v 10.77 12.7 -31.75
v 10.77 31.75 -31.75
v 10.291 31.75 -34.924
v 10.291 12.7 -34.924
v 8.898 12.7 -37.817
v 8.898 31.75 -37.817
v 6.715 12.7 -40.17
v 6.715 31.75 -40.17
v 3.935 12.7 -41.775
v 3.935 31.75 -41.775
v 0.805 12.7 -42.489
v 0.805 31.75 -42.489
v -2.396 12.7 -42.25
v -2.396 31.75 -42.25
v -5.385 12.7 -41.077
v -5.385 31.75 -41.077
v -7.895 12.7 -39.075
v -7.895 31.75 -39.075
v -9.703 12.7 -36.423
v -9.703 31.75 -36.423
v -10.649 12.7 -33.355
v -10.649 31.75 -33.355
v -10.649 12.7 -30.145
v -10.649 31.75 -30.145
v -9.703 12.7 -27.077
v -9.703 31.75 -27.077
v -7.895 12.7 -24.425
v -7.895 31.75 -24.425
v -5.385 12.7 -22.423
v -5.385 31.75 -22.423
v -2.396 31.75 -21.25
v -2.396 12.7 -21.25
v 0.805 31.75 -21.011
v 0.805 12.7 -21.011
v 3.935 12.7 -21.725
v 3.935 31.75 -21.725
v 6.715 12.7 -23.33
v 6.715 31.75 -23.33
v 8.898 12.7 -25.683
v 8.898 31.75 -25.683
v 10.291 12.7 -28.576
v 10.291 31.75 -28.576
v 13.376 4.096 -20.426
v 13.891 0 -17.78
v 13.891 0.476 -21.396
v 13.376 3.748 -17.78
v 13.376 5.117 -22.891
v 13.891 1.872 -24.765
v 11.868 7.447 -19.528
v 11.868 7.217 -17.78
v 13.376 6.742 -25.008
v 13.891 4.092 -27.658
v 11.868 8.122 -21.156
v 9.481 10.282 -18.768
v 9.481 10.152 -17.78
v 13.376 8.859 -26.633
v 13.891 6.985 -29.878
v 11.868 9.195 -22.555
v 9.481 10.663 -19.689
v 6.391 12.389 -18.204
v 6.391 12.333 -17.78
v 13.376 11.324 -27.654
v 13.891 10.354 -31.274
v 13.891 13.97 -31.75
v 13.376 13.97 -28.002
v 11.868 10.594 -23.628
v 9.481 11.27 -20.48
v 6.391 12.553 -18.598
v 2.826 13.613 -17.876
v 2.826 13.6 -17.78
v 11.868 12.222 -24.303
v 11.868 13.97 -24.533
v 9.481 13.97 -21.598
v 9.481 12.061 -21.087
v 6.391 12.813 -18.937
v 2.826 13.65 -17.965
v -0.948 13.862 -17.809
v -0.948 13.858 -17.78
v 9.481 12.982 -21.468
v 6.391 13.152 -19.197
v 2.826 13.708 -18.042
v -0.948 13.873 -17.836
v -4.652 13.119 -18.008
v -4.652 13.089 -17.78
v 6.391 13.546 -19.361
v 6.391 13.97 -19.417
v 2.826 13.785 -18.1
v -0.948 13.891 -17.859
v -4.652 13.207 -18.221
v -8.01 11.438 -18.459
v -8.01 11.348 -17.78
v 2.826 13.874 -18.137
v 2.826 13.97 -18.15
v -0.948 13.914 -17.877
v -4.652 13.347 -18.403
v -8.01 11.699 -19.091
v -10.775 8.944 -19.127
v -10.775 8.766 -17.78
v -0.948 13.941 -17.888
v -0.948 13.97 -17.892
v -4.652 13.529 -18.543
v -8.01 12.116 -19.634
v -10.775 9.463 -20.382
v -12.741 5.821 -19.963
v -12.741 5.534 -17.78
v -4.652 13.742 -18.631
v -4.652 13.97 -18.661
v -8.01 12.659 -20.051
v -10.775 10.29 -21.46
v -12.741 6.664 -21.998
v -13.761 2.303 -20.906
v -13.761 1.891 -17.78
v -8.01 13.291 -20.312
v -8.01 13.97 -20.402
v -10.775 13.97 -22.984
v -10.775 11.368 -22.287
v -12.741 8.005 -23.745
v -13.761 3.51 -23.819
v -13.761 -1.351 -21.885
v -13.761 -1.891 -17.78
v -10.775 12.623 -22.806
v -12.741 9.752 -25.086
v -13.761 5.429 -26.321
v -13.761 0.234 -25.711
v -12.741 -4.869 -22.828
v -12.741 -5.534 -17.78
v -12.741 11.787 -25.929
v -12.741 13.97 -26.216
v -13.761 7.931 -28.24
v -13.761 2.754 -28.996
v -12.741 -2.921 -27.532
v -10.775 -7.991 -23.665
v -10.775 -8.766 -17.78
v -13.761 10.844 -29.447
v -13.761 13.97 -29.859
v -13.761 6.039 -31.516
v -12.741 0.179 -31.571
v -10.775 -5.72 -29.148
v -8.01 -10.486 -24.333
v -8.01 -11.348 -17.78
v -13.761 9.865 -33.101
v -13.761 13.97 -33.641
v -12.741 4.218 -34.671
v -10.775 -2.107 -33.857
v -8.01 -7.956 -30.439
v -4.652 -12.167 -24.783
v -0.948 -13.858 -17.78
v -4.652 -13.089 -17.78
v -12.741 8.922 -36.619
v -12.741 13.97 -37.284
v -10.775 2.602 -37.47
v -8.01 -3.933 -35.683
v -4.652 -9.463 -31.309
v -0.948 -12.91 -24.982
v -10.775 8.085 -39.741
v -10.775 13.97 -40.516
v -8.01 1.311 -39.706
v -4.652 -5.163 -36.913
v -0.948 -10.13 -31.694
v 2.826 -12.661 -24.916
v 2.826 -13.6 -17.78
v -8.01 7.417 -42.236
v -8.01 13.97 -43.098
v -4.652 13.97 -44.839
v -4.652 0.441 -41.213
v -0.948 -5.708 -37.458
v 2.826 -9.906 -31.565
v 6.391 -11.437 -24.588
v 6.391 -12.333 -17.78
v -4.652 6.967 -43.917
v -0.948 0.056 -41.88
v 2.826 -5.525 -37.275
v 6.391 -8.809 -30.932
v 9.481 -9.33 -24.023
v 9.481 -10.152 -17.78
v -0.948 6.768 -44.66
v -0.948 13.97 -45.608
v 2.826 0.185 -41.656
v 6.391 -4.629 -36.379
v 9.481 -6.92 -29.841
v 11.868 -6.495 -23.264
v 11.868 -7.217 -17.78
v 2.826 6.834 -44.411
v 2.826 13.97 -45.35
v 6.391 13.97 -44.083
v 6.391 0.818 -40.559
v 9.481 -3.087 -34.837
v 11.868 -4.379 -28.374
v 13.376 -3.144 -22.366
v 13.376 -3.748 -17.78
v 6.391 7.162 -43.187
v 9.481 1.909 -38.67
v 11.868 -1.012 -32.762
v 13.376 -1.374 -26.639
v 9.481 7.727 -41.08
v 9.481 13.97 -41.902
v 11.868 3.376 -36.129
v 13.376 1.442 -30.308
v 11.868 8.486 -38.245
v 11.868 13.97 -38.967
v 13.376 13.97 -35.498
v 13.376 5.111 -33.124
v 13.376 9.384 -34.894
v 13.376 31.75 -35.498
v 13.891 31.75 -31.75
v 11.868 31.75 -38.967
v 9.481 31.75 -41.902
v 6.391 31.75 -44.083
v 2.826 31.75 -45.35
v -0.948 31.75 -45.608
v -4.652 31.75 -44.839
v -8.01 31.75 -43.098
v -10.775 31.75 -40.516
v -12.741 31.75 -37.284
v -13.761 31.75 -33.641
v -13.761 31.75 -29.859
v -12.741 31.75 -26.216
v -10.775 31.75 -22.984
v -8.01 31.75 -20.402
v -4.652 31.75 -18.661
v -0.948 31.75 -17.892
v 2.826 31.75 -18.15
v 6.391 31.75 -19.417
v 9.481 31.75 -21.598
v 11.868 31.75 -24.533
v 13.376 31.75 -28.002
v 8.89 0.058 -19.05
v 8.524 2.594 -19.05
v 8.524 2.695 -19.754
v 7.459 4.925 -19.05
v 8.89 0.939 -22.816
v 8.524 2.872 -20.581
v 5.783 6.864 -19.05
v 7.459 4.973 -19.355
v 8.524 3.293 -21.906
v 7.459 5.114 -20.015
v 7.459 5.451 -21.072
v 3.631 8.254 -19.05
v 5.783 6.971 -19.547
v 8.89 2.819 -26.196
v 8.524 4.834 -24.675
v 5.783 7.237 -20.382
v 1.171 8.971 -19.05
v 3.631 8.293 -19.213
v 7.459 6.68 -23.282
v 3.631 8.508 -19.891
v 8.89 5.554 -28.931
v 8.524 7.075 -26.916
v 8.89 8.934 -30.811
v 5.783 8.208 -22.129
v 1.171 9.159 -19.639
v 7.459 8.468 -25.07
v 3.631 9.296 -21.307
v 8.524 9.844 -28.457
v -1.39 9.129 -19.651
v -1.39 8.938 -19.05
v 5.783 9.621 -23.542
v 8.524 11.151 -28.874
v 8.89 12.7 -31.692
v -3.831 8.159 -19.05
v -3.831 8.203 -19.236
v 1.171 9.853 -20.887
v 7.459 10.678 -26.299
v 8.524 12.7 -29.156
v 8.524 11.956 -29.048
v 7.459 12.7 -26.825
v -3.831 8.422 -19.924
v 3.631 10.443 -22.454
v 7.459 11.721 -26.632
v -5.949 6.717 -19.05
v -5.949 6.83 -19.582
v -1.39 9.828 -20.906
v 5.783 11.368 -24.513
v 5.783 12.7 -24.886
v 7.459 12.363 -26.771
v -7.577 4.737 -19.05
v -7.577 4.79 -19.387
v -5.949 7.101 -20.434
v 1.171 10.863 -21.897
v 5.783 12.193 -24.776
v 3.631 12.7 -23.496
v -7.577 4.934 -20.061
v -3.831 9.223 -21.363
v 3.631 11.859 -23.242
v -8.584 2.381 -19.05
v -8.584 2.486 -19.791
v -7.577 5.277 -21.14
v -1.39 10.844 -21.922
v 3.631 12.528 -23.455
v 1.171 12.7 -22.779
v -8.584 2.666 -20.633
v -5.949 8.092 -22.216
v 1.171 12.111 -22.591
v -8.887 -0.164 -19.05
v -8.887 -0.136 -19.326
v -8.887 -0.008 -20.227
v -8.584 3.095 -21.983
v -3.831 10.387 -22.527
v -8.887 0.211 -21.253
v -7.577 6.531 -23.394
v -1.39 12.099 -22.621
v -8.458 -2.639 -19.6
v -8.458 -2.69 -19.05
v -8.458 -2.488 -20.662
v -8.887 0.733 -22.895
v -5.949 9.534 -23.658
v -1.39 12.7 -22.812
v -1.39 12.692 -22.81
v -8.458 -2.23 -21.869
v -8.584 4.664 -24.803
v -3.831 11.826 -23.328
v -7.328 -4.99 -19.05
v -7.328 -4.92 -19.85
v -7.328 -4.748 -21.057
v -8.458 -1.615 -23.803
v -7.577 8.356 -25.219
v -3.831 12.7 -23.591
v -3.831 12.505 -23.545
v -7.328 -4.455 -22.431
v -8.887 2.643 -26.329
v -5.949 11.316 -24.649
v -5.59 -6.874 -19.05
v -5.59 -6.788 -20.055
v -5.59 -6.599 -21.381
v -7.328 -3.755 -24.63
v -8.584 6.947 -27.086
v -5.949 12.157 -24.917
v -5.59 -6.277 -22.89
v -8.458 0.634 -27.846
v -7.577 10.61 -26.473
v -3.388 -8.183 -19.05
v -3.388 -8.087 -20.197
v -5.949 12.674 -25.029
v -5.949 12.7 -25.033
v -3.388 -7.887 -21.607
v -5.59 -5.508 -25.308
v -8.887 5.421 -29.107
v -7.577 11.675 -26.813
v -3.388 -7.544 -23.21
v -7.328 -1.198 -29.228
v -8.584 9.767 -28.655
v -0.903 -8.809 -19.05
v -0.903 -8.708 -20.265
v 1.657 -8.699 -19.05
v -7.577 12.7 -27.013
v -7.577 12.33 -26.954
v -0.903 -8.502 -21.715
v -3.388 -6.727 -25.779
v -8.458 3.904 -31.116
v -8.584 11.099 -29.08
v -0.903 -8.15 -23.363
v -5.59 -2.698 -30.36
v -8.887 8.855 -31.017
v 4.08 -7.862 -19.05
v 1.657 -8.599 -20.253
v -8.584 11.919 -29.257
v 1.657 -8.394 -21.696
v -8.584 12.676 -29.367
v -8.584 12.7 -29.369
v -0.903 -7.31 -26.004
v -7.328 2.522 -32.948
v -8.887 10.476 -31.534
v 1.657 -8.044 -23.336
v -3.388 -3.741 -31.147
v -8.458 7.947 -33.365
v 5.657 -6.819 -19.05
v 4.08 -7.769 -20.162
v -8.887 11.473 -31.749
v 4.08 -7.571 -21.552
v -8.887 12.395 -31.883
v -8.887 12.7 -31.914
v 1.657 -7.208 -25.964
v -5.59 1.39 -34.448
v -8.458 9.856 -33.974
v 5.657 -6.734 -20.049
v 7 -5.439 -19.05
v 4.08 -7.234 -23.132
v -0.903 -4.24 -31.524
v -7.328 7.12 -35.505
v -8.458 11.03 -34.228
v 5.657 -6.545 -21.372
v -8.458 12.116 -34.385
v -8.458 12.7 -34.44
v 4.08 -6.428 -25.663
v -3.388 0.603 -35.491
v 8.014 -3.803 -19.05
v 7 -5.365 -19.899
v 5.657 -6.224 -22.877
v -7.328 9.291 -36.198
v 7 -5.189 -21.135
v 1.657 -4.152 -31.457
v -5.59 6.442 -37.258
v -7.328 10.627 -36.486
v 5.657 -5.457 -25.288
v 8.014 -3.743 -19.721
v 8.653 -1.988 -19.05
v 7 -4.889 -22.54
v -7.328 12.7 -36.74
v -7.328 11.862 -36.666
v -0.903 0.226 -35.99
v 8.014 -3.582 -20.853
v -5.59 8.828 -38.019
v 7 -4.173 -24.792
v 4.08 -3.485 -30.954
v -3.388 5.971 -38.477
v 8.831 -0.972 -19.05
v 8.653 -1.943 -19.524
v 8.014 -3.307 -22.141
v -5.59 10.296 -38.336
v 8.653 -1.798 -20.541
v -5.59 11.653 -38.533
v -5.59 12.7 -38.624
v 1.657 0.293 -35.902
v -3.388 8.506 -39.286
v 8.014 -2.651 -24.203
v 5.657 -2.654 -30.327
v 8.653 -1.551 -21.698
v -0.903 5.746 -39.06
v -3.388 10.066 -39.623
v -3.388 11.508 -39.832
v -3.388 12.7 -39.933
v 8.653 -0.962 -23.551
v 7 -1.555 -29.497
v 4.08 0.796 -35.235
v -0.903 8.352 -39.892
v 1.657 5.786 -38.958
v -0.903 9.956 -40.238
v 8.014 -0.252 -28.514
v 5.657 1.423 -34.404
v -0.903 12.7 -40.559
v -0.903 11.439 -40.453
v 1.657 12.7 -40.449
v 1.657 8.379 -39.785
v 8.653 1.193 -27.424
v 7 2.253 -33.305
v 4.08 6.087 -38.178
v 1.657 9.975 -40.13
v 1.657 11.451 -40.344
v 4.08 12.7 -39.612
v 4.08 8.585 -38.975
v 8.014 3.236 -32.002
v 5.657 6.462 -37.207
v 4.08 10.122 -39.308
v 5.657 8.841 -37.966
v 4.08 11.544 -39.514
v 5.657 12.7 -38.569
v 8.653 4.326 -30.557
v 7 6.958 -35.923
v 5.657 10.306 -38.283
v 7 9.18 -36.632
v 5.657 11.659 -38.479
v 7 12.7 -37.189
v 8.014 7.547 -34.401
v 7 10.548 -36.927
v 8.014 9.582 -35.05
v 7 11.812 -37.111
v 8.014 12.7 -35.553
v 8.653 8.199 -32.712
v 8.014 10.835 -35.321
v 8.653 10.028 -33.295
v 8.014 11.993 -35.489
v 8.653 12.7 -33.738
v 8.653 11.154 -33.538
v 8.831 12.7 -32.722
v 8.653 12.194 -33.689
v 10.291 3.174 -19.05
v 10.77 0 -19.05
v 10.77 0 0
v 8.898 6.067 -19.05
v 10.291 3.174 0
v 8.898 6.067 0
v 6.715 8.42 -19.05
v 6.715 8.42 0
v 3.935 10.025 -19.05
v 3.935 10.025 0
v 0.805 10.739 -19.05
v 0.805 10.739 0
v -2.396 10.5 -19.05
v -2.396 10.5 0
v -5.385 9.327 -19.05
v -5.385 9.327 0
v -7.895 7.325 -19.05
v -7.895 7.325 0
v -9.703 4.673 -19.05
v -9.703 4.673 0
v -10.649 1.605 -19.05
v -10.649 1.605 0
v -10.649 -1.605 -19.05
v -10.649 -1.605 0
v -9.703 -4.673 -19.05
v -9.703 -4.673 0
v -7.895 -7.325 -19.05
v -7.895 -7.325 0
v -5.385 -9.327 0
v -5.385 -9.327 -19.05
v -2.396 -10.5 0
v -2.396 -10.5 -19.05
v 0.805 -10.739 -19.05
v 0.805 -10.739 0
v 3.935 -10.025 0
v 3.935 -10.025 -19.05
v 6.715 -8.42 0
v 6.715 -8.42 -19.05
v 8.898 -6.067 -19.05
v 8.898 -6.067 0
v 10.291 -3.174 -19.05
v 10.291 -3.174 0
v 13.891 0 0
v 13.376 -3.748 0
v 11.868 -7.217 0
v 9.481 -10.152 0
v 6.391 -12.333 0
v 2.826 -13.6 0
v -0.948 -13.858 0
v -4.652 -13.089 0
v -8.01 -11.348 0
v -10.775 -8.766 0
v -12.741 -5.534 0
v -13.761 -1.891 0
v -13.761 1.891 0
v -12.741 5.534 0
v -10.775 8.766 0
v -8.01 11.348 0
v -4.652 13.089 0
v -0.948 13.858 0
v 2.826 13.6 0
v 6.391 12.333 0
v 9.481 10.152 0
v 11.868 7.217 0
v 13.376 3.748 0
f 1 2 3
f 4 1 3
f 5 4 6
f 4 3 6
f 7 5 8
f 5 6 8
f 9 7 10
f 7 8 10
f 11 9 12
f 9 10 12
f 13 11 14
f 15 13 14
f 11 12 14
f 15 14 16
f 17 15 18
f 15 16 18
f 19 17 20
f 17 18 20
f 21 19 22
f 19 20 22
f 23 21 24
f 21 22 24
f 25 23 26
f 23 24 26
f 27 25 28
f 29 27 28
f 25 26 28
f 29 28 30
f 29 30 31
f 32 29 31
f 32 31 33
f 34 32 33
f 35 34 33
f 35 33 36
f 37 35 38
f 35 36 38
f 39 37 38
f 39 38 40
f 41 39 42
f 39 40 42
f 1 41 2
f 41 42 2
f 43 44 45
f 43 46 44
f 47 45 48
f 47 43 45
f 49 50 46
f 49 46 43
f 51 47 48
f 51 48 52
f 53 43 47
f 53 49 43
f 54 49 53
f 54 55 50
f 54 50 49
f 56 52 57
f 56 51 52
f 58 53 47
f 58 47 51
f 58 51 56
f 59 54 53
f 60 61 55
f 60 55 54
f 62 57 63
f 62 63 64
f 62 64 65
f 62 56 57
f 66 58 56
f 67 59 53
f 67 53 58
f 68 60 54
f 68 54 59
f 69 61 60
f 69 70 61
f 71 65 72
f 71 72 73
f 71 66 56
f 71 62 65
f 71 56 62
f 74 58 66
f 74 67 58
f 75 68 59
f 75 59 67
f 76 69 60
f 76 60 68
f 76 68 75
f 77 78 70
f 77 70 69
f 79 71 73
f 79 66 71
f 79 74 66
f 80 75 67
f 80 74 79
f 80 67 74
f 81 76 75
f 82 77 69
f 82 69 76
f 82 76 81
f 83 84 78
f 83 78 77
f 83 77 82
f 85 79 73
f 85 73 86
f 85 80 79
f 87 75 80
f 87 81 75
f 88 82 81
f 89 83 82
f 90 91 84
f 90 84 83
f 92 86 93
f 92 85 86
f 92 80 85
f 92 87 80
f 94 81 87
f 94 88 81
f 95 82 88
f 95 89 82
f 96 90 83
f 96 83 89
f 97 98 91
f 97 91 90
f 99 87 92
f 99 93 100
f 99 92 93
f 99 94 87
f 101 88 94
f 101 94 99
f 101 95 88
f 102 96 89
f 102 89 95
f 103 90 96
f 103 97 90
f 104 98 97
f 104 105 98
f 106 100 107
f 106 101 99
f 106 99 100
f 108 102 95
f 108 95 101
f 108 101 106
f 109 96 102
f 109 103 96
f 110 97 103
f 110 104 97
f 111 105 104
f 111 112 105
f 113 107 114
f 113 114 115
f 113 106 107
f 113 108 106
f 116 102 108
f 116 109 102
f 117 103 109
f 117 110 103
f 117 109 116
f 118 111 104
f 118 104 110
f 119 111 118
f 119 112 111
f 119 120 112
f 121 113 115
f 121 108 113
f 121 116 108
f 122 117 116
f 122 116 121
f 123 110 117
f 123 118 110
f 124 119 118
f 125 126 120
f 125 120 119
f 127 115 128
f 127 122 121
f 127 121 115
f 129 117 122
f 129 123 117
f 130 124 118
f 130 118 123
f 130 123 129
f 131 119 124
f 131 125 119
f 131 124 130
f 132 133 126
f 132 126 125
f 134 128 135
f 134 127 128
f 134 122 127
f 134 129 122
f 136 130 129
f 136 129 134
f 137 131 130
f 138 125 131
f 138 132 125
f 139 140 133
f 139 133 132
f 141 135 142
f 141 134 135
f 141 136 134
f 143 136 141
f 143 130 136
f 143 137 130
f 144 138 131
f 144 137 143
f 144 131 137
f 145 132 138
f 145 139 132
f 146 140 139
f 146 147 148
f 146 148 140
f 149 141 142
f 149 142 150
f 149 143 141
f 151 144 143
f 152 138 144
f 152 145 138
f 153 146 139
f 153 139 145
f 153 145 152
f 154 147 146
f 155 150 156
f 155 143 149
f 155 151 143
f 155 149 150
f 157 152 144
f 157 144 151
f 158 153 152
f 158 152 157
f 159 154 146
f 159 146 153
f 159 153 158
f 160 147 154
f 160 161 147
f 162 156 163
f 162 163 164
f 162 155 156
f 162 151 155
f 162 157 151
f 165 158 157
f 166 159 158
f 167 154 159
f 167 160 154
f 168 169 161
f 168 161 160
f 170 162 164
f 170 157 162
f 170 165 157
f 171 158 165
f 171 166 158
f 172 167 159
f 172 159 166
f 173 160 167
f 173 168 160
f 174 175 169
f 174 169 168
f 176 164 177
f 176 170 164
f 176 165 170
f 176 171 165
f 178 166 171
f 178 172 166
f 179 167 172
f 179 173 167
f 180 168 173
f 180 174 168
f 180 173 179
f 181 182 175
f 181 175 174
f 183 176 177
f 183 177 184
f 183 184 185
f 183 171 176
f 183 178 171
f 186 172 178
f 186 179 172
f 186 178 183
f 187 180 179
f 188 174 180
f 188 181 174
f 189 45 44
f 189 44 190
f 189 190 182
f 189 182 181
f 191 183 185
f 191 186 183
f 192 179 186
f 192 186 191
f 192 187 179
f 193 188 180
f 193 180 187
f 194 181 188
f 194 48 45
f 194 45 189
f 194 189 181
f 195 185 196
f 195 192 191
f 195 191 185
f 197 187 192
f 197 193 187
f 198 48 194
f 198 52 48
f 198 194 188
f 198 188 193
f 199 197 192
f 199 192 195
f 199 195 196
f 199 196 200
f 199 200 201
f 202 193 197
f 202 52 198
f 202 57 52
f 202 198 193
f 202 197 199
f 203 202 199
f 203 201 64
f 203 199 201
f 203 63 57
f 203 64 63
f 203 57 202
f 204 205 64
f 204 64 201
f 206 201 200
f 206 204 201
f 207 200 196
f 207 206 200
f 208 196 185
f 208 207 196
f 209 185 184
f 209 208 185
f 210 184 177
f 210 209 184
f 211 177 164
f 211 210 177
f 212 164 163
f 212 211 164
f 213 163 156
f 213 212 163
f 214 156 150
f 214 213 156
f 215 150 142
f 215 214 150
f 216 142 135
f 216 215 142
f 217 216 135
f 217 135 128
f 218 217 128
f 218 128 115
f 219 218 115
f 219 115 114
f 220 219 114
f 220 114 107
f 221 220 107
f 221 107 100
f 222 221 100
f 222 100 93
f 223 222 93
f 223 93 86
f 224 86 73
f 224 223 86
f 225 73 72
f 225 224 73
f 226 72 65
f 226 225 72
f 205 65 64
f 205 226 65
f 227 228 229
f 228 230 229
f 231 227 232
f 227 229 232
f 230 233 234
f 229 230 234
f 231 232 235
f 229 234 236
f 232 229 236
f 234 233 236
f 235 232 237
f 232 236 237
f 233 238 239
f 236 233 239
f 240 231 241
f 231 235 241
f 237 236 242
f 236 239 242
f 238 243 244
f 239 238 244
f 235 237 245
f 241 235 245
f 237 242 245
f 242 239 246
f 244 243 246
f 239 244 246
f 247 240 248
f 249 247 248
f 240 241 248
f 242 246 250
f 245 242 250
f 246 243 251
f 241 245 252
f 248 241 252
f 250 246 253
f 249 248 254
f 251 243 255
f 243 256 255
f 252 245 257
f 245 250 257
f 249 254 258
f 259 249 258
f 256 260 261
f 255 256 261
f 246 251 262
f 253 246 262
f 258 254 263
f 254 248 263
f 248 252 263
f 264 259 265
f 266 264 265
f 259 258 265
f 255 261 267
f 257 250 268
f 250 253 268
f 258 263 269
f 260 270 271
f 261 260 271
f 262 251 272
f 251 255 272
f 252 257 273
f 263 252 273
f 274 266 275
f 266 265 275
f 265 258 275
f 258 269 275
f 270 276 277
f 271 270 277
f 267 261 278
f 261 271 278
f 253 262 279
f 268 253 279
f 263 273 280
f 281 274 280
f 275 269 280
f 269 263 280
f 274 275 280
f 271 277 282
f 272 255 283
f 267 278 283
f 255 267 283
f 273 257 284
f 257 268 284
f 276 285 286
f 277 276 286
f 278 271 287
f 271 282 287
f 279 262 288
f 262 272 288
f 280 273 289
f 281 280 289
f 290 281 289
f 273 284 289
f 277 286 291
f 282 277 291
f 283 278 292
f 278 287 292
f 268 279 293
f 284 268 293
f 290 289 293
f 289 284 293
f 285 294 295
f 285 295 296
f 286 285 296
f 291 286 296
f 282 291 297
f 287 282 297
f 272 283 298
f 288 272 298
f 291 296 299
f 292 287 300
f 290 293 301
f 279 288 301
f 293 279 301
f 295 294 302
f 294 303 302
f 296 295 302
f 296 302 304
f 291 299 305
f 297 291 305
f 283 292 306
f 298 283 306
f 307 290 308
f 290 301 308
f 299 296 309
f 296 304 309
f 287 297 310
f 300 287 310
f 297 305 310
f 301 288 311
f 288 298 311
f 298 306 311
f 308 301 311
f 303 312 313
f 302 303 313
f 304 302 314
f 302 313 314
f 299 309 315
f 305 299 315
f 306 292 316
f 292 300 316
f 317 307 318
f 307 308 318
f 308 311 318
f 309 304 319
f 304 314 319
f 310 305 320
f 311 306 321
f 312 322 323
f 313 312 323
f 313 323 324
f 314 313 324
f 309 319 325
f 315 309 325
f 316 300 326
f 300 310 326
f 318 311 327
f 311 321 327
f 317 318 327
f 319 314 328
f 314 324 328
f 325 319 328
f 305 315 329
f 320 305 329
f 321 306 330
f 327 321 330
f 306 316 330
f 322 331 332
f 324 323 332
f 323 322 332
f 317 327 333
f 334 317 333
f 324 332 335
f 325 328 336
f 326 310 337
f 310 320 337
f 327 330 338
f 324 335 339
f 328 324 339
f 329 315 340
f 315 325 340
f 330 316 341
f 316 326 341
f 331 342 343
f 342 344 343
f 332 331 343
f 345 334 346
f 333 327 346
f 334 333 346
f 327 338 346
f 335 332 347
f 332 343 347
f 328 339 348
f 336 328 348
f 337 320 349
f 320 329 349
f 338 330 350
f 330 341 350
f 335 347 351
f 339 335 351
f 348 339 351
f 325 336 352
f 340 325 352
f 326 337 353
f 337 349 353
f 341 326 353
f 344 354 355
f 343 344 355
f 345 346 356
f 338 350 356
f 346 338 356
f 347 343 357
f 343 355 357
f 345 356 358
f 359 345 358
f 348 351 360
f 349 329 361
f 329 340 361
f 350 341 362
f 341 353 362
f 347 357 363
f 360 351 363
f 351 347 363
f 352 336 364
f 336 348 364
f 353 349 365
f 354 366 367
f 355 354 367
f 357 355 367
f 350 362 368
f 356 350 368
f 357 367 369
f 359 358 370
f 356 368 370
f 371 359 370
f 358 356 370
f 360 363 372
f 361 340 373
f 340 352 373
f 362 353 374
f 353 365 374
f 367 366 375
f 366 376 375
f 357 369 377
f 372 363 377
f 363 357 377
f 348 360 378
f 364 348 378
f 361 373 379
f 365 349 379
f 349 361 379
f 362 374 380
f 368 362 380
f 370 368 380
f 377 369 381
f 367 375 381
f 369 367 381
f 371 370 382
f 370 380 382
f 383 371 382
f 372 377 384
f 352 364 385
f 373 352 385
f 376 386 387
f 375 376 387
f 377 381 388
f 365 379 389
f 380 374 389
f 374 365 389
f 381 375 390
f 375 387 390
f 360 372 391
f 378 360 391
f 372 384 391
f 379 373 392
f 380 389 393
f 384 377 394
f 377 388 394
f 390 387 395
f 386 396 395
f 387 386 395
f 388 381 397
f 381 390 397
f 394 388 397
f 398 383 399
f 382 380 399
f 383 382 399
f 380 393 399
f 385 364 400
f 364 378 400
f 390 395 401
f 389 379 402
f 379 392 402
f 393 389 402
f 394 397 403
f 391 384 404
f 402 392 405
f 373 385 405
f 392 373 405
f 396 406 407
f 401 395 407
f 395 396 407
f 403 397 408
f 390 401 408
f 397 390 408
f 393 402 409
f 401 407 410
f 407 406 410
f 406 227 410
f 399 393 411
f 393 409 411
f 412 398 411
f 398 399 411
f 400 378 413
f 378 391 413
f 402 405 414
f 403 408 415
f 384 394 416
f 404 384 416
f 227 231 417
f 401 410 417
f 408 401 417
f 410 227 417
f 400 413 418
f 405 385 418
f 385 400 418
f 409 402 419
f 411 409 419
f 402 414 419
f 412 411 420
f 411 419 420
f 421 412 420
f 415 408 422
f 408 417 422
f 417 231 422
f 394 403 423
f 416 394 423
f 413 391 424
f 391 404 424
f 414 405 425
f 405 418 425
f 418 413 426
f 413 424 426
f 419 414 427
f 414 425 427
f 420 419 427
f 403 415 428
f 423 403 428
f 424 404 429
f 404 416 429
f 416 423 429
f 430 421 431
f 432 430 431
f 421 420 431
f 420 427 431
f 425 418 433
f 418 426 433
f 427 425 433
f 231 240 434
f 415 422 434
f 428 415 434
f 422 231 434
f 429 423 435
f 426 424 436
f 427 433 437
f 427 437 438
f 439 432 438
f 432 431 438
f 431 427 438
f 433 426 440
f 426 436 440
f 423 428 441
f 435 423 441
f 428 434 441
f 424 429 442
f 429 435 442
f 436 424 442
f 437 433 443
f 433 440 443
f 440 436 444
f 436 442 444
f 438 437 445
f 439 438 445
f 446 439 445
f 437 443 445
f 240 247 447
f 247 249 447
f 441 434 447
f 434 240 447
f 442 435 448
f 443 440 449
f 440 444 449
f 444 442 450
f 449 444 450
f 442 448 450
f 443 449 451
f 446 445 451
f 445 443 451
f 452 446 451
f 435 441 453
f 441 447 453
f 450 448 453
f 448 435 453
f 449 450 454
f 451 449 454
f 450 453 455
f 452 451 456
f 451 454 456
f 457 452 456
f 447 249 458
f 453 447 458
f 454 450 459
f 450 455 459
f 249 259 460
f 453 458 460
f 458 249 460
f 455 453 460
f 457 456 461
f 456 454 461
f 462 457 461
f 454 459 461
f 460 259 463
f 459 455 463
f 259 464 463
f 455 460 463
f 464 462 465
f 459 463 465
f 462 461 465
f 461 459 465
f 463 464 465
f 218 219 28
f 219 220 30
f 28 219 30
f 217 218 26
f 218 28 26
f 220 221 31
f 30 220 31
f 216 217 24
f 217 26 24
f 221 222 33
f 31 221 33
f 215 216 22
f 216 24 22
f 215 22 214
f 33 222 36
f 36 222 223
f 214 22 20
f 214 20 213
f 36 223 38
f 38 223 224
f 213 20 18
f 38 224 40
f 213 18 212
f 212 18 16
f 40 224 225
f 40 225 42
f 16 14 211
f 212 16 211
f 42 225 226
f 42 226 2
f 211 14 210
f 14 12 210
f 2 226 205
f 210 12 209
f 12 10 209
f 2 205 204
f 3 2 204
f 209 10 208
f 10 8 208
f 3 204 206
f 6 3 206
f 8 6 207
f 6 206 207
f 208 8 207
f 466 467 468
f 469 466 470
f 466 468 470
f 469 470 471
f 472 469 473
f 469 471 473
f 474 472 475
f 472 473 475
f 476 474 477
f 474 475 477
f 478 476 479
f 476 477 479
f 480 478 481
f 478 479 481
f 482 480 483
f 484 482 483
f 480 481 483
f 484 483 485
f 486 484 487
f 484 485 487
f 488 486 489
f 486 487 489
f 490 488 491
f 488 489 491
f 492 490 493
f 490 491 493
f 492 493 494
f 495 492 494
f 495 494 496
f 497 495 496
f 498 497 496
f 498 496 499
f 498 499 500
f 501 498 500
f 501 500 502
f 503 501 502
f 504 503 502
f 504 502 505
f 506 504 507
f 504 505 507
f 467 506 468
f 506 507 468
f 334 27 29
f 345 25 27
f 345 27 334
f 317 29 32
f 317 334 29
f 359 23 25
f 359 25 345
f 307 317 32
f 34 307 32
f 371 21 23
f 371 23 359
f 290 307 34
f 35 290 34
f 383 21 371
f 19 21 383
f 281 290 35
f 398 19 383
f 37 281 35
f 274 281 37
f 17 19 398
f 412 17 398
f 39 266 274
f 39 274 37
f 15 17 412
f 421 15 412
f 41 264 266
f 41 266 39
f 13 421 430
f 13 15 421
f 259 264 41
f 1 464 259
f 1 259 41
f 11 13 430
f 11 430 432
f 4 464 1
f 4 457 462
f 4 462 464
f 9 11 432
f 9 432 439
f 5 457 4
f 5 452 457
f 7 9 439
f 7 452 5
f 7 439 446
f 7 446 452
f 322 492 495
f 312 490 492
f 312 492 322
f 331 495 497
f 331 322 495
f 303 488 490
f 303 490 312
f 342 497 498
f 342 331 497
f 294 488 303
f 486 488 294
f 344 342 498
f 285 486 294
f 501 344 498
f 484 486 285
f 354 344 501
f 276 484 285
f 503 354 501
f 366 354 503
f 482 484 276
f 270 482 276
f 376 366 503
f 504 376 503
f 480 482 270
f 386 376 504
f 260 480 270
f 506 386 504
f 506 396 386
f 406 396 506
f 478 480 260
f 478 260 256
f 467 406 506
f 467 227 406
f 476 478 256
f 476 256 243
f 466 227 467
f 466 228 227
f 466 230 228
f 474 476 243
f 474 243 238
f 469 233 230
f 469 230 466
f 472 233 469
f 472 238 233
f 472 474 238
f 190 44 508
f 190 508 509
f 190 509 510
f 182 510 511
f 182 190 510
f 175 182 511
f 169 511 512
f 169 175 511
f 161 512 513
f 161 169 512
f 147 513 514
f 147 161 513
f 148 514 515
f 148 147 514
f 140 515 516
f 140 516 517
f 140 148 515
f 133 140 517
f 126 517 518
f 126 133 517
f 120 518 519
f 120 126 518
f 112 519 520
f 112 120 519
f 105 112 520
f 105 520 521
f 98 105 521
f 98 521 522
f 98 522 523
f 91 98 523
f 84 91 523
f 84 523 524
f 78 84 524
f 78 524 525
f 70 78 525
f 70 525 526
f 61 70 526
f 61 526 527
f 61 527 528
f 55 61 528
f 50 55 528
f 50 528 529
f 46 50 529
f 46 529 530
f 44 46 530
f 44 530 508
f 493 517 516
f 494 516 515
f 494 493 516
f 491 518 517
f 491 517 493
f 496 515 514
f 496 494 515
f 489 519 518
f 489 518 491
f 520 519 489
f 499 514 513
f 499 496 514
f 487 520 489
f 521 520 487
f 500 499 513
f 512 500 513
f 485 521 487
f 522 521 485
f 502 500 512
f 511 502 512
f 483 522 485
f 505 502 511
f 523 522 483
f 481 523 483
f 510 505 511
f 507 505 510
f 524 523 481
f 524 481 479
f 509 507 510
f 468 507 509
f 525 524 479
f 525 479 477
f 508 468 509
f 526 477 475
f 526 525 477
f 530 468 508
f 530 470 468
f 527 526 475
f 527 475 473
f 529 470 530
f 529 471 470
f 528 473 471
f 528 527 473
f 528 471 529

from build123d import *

# Parameters (mm, degrees)
SKETCH1_R          = 13.890625
SKETCH1_R_2        = 8.89
SKETCH3_R          = 10.7696
CUT_EXTRUDE1_DEPTH = 19.05
SKETCH4_R          = 10.7696
CUT_EXTRUDE2_DEPTH = 19.05


with BuildPart() as part:
    # Sweep1: sweep along a path in Sketch2
    with BuildLine(Plane(origin=(0, 0, 0), x_dir=(0, 0, -1), z_dir=(1, 0, 0))) as sweep1_path:
        Line((0, 0), (17.78, 0))
        ThreePointArc((17.78, 0), (27.658281733, 4.091718267), (31.75, 13.97))
        Line((31.75, 13.97), (31.75, 31.75))
    # Sketch1 → Sweep1 (sweep)
    with BuildSketch(Plane.XY):
        Circle(SKETCH1_R)
        Circle(SKETCH1_R_2, mode=Mode.SUBTRACT)
    sweep(path=sweep1_path.line)

    # Sketch3 → Cut-Extrude1 (cut)
    with BuildSketch(Plane.XY):
        Circle(SKETCH3_R)
    extrude(amount=-CUT_EXTRUDE1_DEPTH, mode=Mode.SUBTRACT)

    # Sketch4 → Cut-Extrude2 (cut)
    with BuildSketch(Plane(origin=(0, 31.75, 0), x_dir=(1, 0, 0), z_dir=(0, 1, 0))):
        with Locations((0, 31.75)):
            Circle(SKETCH4_R)
    extrude(amount=-CUT_EXTRUDE2_DEPTH, mode=Mode.SUBTRACT)


solid = part.part
